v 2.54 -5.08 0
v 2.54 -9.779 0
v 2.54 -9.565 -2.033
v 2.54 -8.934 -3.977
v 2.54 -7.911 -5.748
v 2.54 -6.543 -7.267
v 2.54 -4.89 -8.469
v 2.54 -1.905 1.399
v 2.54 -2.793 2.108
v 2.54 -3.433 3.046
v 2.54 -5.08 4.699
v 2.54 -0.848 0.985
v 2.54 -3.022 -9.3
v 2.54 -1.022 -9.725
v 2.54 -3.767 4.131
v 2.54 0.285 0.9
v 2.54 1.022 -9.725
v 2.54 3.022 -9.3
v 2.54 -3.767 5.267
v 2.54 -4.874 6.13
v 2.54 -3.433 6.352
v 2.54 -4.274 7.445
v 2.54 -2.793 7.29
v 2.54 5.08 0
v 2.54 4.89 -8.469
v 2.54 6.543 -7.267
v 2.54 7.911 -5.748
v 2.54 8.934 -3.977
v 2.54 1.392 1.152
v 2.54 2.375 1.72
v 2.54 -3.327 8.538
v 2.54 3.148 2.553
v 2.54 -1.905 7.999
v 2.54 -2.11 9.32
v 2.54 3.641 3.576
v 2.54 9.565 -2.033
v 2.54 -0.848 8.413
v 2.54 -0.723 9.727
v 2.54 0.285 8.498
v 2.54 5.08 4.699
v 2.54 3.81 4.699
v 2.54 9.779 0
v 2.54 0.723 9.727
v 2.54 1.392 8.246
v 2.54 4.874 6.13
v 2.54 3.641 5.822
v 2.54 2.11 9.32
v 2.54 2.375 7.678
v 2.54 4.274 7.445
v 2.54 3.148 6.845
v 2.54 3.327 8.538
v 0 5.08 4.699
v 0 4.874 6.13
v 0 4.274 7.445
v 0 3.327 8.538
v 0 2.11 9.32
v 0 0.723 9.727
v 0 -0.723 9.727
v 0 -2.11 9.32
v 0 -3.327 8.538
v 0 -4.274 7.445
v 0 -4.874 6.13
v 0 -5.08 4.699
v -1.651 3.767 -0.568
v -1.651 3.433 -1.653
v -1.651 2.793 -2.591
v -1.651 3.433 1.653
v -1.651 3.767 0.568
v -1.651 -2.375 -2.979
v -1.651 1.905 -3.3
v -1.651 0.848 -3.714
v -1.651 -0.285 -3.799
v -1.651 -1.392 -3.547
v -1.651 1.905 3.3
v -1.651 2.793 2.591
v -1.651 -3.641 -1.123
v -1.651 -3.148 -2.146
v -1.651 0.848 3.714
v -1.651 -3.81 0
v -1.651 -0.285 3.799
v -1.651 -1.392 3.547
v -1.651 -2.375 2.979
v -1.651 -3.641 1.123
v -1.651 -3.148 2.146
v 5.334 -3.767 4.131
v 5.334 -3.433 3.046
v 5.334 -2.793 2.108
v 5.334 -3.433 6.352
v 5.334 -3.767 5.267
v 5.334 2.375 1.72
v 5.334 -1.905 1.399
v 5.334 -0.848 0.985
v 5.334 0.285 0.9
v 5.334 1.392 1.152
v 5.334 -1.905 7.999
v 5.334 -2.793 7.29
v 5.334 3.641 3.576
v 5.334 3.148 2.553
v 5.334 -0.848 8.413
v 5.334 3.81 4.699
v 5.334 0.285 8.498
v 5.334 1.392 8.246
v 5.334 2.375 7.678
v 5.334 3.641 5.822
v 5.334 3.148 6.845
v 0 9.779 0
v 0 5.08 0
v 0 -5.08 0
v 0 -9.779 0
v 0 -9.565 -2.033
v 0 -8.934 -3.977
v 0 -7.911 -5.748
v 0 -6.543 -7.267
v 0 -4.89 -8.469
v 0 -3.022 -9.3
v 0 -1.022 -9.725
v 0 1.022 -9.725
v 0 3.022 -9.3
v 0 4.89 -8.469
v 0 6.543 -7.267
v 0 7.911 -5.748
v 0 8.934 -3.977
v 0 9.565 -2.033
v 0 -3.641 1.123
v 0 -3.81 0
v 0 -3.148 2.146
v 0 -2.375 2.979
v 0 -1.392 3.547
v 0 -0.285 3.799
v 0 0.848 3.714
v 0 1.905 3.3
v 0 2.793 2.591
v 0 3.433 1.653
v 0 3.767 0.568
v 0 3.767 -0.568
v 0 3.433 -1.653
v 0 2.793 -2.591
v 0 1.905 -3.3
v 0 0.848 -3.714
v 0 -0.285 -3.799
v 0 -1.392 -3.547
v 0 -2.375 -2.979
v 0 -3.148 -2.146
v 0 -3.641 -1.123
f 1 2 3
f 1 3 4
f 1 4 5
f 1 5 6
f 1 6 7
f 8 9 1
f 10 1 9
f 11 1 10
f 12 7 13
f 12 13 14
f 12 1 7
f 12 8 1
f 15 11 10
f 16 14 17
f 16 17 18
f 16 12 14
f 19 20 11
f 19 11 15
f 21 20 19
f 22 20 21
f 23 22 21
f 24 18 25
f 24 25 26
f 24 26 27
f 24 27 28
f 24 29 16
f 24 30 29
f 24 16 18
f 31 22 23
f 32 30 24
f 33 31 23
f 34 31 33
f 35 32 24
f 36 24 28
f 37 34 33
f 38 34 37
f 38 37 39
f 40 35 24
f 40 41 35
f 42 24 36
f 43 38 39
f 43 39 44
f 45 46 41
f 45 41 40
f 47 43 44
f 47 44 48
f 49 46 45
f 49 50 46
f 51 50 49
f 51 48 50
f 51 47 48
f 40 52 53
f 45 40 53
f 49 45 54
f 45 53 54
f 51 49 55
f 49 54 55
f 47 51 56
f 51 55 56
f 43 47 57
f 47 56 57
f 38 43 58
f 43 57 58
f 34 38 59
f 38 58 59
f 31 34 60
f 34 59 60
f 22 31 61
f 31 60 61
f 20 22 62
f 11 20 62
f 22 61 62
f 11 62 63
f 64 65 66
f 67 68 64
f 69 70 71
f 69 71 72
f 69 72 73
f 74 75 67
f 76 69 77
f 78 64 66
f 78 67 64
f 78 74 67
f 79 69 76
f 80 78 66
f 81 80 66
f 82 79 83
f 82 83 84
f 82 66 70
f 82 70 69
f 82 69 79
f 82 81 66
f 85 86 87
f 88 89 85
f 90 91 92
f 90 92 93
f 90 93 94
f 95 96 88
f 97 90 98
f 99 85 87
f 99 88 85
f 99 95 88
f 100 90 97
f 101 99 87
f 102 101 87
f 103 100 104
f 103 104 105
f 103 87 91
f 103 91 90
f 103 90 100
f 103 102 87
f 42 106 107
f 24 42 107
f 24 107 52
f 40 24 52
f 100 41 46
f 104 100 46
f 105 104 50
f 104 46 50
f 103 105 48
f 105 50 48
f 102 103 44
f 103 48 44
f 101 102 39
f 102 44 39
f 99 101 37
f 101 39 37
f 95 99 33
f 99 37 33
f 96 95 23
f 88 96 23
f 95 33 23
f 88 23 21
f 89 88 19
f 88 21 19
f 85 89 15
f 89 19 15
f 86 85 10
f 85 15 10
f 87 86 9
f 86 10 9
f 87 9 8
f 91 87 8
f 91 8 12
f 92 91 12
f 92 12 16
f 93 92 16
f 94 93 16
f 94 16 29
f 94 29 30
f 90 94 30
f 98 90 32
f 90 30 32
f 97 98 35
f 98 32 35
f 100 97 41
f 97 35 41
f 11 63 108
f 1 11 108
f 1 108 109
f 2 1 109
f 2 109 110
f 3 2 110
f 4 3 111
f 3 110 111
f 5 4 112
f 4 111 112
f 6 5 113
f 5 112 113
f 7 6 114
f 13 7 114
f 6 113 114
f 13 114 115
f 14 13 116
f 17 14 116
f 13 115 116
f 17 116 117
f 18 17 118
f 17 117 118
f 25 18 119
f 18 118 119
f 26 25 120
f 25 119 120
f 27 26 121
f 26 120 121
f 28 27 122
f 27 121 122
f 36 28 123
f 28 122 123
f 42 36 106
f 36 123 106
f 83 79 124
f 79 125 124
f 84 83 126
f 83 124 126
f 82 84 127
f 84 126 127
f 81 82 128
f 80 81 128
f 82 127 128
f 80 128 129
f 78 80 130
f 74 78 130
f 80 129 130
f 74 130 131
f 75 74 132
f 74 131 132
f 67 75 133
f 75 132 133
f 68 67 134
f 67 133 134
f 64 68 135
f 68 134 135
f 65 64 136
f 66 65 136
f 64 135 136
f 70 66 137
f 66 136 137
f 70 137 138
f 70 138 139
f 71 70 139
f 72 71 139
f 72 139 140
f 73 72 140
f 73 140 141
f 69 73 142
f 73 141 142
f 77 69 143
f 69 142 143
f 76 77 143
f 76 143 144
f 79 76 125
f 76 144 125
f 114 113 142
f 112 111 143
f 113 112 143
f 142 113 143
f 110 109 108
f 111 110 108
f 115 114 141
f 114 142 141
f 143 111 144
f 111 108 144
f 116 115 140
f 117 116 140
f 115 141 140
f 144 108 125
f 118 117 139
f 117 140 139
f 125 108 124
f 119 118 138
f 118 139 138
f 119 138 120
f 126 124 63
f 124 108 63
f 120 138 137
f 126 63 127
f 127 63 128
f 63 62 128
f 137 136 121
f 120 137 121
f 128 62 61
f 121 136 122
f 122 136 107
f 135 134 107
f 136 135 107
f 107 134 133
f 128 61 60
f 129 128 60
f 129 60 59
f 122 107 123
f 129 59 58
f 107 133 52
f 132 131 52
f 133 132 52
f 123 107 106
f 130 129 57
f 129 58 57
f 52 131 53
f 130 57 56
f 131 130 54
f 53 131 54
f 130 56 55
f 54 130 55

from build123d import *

# Parameters (mm, degrees)
F1_DEPTH  = 2.54
F2_R      = 3.81
F3_DEPTH  = 2.794
F4_R      = 3.81
F5_DEPTH  = 1.5621
F5_FACE_R = 3.81
F6_DEPTH  = 0.0889


with BuildPart() as f1:
    # F0 (on Right) → F1 (new body)
    with BuildSketch(Plane.YZ):
        with BuildLine():
            Line((5.08, 0), (5.08, 4.699))
            ThreePointArc((5.08, 4.699), (0, 9.779), (-5.08, 4.699))
            Line((-5.08, 4.699), (-5.08, 0))
            Line((-5.08, 0), (-9.779, 0))
            ThreePointArc((-9.779, 0), (0, -9.779), (9.779, 0))
            Line((9.779, 0), (5.08, 0))
        make_face()
    extrude(amount=F1_DEPTH)

    # F2 (on face) → F3 (join)
    with BuildSketch(Plane.YZ.offset(2.54)):
        with Locations((0, 4.699)):
            Circle(F2_R)
    extrude(amount=F3_DEPTH)

    # F4 (on face) → F5 (join)
    with BuildSketch(Plane(origin=(0, 0, 0), x_dir=(0, -1, 0), z_dir=(-1, 0, 0))):
        Circle(F4_R)
    extrude(amount=F5_DEPTH)

    # F5_face (on face) → F6 (join)
    with BuildSketch(Plane(origin=(-1.5621, 0, 0), x_dir=(0, -1, 0), z_dir=(-1, 0, 0))):
        Circle(F5_FACE_R)
    extrude(amount=F6_DEPTH)


solid = f1.part
